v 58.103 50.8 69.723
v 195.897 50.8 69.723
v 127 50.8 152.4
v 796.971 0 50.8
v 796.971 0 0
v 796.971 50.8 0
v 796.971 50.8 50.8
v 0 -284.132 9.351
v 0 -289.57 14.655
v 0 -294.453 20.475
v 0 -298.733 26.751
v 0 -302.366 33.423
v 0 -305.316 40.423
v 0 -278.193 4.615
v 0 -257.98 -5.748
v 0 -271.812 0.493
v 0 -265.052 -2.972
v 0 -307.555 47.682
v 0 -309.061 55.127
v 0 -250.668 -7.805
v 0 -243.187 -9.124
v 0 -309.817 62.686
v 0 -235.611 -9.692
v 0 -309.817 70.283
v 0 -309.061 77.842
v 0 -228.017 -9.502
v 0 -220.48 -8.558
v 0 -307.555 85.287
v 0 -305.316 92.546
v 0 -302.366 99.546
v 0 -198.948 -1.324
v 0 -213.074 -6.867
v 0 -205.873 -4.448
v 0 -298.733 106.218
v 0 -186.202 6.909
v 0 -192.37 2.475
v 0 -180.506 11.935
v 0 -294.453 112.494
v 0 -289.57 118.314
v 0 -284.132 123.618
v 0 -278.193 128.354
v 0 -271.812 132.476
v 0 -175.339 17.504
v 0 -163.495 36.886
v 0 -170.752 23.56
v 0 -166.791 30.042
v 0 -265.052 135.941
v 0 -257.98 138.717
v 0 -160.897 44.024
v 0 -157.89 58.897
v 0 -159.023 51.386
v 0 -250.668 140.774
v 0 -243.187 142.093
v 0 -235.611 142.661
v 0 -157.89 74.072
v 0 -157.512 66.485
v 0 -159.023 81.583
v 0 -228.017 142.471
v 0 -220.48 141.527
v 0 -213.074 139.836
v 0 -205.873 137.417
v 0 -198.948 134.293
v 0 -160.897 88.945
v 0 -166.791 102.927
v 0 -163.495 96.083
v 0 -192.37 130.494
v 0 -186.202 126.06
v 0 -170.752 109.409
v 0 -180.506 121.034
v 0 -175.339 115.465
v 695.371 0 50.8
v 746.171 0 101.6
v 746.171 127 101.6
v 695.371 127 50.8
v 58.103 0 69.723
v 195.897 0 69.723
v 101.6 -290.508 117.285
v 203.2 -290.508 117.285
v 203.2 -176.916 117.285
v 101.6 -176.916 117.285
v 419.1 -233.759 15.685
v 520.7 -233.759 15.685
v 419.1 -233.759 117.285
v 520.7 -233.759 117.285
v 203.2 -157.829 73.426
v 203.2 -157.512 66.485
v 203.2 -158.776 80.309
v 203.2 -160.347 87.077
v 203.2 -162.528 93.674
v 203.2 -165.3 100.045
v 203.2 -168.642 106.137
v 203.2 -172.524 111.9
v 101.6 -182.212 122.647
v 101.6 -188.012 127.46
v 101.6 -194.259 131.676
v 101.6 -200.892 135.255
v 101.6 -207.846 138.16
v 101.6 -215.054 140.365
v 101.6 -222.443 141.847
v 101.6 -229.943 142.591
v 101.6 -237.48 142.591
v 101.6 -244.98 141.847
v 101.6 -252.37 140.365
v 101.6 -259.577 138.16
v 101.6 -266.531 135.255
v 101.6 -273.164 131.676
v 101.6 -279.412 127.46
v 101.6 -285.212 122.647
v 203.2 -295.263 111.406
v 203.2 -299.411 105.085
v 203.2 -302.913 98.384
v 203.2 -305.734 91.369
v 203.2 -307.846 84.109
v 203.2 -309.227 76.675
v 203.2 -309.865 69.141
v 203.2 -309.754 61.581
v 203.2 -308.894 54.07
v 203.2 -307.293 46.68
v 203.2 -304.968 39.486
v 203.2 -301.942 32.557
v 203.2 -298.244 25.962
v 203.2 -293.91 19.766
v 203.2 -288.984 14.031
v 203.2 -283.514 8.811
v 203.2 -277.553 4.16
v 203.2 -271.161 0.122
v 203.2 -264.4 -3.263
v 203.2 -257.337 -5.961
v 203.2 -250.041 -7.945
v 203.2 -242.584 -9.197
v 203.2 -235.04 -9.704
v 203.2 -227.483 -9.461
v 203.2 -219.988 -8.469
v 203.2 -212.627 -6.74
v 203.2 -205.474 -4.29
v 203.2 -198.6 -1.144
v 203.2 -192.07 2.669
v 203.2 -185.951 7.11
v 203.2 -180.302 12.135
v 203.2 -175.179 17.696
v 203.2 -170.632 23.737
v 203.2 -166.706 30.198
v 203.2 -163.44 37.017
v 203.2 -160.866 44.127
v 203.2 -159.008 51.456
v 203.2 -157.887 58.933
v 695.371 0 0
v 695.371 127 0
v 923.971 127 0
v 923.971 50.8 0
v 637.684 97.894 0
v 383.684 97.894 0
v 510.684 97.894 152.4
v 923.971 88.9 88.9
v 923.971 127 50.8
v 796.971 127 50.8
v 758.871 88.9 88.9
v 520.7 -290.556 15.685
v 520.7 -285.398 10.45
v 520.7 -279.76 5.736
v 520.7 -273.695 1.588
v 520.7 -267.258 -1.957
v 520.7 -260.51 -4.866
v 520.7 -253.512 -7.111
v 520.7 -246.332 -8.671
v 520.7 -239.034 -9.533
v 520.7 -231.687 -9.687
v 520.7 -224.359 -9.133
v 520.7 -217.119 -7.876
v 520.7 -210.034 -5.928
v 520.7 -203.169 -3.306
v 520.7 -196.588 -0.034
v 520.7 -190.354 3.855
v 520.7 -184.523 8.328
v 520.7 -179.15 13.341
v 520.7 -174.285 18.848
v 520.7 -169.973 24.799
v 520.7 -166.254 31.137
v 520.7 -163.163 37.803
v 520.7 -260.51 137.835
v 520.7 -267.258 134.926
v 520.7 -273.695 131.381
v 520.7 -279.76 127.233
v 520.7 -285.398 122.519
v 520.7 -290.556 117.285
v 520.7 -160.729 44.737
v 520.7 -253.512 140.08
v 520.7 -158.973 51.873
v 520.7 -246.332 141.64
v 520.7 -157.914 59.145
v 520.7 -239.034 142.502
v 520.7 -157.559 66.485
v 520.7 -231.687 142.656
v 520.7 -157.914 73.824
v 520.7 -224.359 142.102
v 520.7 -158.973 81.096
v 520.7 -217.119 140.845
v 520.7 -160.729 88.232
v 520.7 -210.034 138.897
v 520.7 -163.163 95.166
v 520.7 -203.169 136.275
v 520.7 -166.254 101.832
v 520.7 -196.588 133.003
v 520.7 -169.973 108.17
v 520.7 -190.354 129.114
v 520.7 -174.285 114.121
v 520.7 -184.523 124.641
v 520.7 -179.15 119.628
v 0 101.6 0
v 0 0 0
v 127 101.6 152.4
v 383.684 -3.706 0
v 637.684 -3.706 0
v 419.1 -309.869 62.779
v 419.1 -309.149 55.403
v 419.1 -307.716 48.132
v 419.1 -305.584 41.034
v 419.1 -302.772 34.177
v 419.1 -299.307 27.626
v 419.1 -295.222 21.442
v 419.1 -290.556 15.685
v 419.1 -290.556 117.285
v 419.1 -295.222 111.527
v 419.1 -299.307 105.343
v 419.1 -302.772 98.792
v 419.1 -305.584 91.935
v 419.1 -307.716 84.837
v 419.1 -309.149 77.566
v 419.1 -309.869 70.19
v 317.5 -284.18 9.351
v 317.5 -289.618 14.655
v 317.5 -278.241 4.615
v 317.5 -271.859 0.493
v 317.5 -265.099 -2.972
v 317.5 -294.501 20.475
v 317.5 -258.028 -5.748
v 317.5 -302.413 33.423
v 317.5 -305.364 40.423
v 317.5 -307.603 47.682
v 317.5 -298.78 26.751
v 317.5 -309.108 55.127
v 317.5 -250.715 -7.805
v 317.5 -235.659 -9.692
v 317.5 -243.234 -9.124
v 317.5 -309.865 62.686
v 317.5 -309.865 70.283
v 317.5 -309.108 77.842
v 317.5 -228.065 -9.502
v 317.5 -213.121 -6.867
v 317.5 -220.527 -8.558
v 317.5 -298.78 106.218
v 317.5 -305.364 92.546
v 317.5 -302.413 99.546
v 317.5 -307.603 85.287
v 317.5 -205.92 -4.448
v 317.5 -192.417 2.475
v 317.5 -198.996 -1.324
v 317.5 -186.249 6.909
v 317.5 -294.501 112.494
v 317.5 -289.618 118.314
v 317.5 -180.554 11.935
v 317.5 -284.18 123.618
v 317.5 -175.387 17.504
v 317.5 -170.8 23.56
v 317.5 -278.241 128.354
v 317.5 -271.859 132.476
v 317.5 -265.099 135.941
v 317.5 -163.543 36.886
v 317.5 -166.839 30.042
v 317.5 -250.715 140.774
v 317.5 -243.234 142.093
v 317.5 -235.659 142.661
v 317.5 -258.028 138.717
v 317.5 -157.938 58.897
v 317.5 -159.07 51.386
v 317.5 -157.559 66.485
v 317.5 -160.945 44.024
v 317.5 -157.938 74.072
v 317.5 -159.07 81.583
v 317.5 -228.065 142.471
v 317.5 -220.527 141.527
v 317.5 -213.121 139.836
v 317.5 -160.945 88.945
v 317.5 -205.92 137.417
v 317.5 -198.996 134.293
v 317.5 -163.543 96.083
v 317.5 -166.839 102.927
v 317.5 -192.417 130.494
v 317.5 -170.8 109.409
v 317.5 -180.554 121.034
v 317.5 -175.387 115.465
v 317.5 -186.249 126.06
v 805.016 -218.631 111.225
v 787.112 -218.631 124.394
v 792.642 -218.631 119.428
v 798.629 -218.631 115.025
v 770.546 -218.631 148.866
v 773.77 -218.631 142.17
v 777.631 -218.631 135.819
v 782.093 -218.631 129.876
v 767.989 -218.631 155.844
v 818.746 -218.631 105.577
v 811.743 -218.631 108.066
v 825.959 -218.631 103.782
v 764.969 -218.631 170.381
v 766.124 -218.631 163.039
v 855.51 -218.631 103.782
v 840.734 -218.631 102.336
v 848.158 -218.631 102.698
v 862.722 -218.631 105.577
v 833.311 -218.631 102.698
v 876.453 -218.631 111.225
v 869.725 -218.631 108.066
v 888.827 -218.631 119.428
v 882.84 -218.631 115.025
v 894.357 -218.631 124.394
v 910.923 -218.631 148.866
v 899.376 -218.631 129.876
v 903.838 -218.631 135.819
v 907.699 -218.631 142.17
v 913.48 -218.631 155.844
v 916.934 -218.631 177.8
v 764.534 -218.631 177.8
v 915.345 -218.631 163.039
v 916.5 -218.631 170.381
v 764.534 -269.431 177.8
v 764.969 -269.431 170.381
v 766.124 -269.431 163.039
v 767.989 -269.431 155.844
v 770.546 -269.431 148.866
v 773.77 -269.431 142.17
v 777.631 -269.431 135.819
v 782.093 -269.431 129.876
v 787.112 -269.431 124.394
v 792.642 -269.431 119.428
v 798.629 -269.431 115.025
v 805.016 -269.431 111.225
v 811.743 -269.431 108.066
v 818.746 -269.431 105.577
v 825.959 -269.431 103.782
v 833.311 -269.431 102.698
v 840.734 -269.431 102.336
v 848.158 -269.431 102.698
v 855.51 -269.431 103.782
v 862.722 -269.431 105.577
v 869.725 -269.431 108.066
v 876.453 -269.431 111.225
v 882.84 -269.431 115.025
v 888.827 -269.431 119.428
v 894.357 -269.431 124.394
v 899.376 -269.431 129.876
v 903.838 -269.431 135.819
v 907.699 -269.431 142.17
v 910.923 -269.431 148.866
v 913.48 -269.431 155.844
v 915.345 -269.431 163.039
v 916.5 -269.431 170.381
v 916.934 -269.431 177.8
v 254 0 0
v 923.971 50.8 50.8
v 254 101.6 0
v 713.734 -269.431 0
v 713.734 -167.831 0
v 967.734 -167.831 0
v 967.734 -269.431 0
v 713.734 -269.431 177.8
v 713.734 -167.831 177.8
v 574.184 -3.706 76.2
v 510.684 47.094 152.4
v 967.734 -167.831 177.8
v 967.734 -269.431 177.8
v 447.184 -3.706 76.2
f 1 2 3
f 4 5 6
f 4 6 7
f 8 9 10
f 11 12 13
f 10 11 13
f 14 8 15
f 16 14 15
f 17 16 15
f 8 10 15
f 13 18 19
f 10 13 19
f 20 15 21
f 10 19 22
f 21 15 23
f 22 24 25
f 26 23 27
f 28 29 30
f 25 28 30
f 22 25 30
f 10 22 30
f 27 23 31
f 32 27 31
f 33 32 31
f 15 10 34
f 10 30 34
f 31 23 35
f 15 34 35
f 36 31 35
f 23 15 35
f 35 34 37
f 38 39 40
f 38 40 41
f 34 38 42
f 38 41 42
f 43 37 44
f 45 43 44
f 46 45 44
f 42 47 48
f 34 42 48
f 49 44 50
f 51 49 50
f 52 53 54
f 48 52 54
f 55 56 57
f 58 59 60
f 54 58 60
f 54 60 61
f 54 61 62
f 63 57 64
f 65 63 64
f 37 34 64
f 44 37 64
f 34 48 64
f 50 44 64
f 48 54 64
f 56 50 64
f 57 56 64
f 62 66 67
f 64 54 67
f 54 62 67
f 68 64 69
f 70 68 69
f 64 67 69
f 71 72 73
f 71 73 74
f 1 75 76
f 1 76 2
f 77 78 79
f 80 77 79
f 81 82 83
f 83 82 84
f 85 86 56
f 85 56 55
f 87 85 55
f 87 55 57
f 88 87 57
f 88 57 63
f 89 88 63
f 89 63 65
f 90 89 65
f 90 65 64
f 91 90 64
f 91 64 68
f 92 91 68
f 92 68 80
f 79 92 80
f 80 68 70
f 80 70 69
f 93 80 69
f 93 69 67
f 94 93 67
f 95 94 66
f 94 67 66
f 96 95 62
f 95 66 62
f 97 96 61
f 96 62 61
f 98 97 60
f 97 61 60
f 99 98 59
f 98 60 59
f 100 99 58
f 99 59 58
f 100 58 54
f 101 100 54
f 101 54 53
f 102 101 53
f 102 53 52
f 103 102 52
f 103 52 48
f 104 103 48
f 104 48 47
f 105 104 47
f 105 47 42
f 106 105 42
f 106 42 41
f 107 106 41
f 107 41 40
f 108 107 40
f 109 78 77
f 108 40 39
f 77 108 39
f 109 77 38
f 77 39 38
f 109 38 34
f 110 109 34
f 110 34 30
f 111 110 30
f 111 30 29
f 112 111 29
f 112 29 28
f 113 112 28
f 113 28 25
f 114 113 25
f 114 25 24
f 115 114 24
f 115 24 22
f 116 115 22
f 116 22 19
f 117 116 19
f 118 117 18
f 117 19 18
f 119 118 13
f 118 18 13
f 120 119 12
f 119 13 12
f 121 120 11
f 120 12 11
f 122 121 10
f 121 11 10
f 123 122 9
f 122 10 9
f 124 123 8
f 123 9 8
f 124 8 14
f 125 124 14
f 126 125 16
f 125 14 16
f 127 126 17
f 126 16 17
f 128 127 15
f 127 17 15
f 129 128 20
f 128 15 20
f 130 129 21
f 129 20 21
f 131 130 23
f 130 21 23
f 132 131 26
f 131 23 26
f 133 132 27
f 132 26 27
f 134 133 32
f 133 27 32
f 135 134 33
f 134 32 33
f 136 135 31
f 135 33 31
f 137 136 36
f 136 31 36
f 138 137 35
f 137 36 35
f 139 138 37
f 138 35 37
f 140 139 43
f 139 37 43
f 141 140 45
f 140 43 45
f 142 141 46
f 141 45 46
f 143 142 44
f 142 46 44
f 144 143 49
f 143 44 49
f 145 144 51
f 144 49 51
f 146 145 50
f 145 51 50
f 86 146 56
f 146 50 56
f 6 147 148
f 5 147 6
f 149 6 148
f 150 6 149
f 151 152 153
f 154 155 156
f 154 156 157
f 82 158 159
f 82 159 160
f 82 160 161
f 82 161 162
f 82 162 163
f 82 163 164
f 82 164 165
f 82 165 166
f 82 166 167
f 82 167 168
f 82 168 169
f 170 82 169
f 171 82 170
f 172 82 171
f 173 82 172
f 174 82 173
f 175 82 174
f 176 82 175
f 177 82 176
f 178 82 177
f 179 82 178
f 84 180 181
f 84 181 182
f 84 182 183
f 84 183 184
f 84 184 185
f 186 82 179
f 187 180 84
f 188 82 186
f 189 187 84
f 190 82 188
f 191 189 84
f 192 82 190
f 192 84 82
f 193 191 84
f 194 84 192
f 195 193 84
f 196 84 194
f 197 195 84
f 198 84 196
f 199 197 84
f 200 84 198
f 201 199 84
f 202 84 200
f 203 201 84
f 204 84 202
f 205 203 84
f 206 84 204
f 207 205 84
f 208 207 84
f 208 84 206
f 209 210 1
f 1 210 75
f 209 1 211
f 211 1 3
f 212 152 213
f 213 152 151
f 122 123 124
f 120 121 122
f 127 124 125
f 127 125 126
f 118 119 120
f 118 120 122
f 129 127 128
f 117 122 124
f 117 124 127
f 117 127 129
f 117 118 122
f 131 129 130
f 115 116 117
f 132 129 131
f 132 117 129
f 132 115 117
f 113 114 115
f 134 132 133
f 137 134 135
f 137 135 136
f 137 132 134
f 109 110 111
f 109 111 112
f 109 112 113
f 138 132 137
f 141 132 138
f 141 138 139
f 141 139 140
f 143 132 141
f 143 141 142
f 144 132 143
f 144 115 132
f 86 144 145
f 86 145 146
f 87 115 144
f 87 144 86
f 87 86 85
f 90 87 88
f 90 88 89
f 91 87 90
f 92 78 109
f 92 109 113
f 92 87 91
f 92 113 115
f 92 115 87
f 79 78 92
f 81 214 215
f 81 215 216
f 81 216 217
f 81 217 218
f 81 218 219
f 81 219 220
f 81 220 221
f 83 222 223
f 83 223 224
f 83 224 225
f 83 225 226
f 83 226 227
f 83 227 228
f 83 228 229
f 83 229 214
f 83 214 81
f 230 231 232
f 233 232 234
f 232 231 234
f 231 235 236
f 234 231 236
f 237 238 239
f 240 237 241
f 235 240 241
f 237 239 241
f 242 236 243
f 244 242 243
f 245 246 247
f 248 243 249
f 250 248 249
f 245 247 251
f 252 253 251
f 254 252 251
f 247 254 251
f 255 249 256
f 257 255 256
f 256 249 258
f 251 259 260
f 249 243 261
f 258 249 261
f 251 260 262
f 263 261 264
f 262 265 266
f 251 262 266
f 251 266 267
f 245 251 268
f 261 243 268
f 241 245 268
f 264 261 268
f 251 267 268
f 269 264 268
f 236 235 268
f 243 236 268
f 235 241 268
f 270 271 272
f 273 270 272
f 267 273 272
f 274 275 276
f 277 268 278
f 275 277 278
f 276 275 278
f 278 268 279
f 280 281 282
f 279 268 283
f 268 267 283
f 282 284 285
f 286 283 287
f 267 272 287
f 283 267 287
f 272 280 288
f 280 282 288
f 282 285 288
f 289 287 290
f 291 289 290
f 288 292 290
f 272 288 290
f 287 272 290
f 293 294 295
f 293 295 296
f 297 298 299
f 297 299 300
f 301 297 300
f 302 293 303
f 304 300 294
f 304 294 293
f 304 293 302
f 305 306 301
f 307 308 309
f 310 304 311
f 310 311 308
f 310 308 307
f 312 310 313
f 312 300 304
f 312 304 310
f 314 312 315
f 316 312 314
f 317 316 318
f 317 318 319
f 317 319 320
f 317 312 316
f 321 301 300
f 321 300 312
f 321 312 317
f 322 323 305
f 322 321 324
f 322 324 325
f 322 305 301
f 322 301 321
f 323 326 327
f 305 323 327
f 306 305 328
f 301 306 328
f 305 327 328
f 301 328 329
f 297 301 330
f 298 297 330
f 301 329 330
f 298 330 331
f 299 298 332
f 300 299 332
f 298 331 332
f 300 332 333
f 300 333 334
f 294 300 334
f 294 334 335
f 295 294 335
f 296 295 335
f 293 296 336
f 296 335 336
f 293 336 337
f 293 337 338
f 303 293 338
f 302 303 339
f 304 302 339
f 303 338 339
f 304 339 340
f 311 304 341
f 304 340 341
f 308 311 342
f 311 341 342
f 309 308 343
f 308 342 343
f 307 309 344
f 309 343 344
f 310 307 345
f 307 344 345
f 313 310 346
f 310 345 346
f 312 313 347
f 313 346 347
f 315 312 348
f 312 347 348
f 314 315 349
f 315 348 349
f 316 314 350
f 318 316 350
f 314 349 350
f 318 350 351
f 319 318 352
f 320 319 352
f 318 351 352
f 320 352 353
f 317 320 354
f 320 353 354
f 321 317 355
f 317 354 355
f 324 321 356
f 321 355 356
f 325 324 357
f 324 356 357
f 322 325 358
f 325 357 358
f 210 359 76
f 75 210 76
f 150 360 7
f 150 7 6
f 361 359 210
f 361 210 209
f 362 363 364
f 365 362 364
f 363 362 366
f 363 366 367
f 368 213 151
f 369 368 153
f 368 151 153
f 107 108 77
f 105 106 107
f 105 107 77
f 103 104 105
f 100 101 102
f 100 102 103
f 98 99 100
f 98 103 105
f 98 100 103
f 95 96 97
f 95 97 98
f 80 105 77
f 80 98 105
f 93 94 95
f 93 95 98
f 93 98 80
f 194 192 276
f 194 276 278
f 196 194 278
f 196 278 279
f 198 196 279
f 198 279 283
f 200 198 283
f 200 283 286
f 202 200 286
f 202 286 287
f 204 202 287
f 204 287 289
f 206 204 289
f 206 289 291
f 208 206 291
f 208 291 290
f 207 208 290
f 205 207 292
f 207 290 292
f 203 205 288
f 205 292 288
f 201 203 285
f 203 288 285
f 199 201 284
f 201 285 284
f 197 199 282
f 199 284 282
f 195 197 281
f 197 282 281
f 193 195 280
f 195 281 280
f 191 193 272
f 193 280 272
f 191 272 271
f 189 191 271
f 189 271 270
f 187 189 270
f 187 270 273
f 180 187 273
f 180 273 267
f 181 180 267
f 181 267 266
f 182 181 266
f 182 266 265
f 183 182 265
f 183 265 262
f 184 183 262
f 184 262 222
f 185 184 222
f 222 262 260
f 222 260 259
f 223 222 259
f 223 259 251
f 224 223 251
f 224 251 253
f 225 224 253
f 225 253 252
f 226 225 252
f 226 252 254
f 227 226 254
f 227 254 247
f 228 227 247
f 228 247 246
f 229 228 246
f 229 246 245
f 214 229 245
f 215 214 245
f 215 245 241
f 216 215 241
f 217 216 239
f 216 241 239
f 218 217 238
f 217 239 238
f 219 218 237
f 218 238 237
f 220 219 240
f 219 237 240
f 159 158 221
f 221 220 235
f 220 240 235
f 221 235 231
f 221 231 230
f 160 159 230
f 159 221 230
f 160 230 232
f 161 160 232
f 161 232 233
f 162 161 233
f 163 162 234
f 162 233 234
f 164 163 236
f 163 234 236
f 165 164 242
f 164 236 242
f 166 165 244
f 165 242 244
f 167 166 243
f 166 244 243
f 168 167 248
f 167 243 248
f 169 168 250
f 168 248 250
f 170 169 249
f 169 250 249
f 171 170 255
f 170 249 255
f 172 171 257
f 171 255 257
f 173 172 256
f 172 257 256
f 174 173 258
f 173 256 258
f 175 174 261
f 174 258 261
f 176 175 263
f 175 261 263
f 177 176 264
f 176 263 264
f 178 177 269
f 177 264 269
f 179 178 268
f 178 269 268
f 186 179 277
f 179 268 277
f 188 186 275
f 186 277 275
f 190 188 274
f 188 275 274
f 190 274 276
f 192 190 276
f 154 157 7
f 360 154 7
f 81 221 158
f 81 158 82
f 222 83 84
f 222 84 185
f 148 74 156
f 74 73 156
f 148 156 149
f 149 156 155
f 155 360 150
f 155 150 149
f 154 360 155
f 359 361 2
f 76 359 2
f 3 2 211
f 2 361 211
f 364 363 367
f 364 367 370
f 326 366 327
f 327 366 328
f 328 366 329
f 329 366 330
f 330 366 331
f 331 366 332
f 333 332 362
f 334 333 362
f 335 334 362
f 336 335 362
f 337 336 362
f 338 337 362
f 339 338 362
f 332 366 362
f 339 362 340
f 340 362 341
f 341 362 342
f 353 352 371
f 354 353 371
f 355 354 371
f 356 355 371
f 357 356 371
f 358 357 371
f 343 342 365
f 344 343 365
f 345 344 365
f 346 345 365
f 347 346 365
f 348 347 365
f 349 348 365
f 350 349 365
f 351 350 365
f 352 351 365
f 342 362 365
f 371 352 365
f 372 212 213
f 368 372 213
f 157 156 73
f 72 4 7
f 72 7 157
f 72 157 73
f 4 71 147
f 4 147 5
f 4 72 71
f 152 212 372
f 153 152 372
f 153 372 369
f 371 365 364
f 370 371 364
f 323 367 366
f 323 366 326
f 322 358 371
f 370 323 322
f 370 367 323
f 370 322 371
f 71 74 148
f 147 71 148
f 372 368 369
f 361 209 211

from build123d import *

# Parameters (mm, degrees)
F0_W      = 101.6
F0_H      = 152.4
F1_DEPTH  = 254
F3_DEPTH  = 101.6
F4_W      = 50.8
F4_H      = 82.6769973874
F5_DEPTH  = 249.428
F6_W      = 254
F6_H      = 101.6
F7_DEPTH  = 152.4
F9_DEPTH  = 101.6
F11_DEPTH = 205.486
F13_DEPTH = 152.4
F15_DEPTH = 444.5
F17_DEPTH = 127
F21_R     = 76.2
F22_DEPTH = 203.2
F24_DEPTH = 101.6
F26_R     = 76.2
F27_DEPTH = 203.2
F29_DEPTH = 101.6
F30_W     = 254
F30_H     = 101.6
F31_DEPTH = 177.8
F33_DEPTH = 50.8


with BuildPart() as f1:
    # F0 (on Right) → F1 (new body)
    with BuildSketch(Plane.YZ):
        with Locations((50.8, 76.2)):
            Rectangle(F0_W, F0_H)
    extrude(amount=F1_DEPTH)

    # F2 (on face) → F3 (cut)
    with BuildSketch(Plane.XZ):
        Polygon((0, 0), (127, 152.4), (0, 152.4), align=None)
    extrude(amount=-F3_DEPTH, mode=Mode.SUBTRACT)

    # F4 (on face) → F5 (cut)
    with BuildSketch(Plane.YZ.offset(254)):
        with Locations((25.4, 111.0615013063)):
            Rectangle(F4_W, F4_H)
    extrude(amount=-F5_DEPTH, mode=Mode.SUBTRACT)

    # F14 (on face) → F15 (cut)
    with BuildSketch(Plane(origin=(0, 101.6, 0), x_dir=(-1, 0, 0), z_dir=(0, 1, 0))):
        Polygon((-254, 152.4), (-254, 0), (-127, 152.4), align=None)
    extrude(amount=-F15_DEPTH, mode=Mode.SUBTRACT)


with BuildPart() as f7:
    # F6 (on Top) → F7 (new body)
    with BuildSketch(Plane.XY):
        with Locations((510.6836408377, 47.0942814716)):
            Rectangle(F6_W, F6_H)
    extrude(amount=F7_DEPTH)

    # F8 (on face) → F9 (cut)
    with BuildSketch(Plane.XZ.offset(3.7057185284)):
        Polygon((383.6836408377, 0), (510.6836408377, 152.4), (383.6836408377, 152.4), align=None)
    extrude(amount=-F9_DEPTH, mode=Mode.SUBTRACT)

    # F10 (on face) → F11 (cut)
    with BuildSketch(Plane.YZ.offset(637.6836408377)):
        Polygon((-3.7057185284, 152.4), (-3.7057185284, 76.2), (47.0942814716, 152.4), align=None)
    extrude(amount=-F11_DEPTH, mode=Mode.SUBTRACT)

    # F12 (on face) → F13 (cut)
    with BuildSketch(Plane(origin=(0, 97.8942814716, 0), x_dir=(-1, 0, 0), z_dir=(0, 1, 0))):
        Polygon((-637.6836408377, 152.4), (-637.6836408377, 0), (-510.6836408377, 152.4), align=None)
    extrude(amount=-F13_DEPTH, mode=Mode.SUBTRACT)


with BuildPart() as f17:
    # F16 (on Front) → F17 (new body)
    with BuildSketch(Plane.XZ):
        Polygon((695.3714161174, 50.8), (695.3714161174, 0), (796.9714161174, 0), (796.9714161174, 50.8), (746.1714161174, 101.6), align=None)
    extrude(amount=-F17_DEPTH)

    # F19 (on offset) → F20 (join, up to the next surface of F17)
    with BuildSketch(Plane.YZ.offset(923.9714161174)):
        Polygon((50.8, 50.8), (50.8, 0), (127, 0), (127, 50.8), (88.9, 88.9), align=None)
    extrude(until=Until.NEXT, dir=(-1, 0, 0))


with BuildPart() as f22:
    # F21 (on Right) → F22 (new body)
    with BuildSketch(Plane.YZ):
        with Locations((-233.7117493153, 66.484503448)):
            Circle(F21_R)
    extrude(amount=F22_DEPTH)

    # F23 (on face) → F24 (cut)
    with BuildSketch(Plane.YZ.offset(203.2)):
        with BuildLine():
            Line((-290.5078759438, 117.284503448), (-176.9156226868, 117.284503448))
            ThreePointArc((-176.9156226868, 117.284503448), (-233.7117493153, 142.684503448), (-290.5078759438, 117.284503448))
        make_face()
    extrude(amount=-F24_DEPTH, mode=Mode.SUBTRACT)


with BuildPart() as f27:
    # F26 (on offset) → F27 (new body)
    with BuildSketch(Plane.YZ.offset(317.5)):
        with Locations((-233.7593734264, 66.484503448)):
            Circle(F26_R)
    extrude(amount=F27_DEPTH)

    # F28 (on face) → F29 (cut)
    with BuildSketch(Plane.YZ.offset(520.7)):
        with BuildLine():
            Line((-233.7593734264, 15.684503448), (-233.7593734264, 66.484503448))
            Line((-233.7593734264, 66.484503448), (-233.7593734264, 117.284503448))
            Line((-233.7593734264, 117.284503448), (-290.5555000549, 117.284503448))
            ThreePointArc((-290.5555000549, 117.284503448), (-309.9593734264, 66.484503448), (-290.5555000549, 15.684503448))
            Line((-290.5555000549, 15.684503448), (-233.7593734264, 15.684503448))
        make_face()
    extrude(amount=-F29_DEPTH, mode=Mode.SUBTRACT)


with BuildPart() as f31:
    # F30 (on Top) → F31 (new body)
    with BuildSketch(Plane.XY):
        with Locations((840.7344479561, -218.6306758404)):
            Rectangle(F30_W, F30_H)
    extrude(amount=F31_DEPTH)

    # F32 (on face) → F33 (cut)
    with BuildSketch(Plane.XZ.offset(269.4306758404)):
        with BuildLine():
            Line((916.9344479561, 177.8), (764.5344479561, 177.8))
            ThreePointArc((764.5344479561, 177.8), (840.7344479561, 102.3356958662), (916.9344479561, 177.8))
        make_face()
    extrude(amount=-F33_DEPTH, mode=Mode.SUBTRACT)


solid = Compound([f1.part, f7.part, f17.part, f22.part, f27.part, f31.part])
